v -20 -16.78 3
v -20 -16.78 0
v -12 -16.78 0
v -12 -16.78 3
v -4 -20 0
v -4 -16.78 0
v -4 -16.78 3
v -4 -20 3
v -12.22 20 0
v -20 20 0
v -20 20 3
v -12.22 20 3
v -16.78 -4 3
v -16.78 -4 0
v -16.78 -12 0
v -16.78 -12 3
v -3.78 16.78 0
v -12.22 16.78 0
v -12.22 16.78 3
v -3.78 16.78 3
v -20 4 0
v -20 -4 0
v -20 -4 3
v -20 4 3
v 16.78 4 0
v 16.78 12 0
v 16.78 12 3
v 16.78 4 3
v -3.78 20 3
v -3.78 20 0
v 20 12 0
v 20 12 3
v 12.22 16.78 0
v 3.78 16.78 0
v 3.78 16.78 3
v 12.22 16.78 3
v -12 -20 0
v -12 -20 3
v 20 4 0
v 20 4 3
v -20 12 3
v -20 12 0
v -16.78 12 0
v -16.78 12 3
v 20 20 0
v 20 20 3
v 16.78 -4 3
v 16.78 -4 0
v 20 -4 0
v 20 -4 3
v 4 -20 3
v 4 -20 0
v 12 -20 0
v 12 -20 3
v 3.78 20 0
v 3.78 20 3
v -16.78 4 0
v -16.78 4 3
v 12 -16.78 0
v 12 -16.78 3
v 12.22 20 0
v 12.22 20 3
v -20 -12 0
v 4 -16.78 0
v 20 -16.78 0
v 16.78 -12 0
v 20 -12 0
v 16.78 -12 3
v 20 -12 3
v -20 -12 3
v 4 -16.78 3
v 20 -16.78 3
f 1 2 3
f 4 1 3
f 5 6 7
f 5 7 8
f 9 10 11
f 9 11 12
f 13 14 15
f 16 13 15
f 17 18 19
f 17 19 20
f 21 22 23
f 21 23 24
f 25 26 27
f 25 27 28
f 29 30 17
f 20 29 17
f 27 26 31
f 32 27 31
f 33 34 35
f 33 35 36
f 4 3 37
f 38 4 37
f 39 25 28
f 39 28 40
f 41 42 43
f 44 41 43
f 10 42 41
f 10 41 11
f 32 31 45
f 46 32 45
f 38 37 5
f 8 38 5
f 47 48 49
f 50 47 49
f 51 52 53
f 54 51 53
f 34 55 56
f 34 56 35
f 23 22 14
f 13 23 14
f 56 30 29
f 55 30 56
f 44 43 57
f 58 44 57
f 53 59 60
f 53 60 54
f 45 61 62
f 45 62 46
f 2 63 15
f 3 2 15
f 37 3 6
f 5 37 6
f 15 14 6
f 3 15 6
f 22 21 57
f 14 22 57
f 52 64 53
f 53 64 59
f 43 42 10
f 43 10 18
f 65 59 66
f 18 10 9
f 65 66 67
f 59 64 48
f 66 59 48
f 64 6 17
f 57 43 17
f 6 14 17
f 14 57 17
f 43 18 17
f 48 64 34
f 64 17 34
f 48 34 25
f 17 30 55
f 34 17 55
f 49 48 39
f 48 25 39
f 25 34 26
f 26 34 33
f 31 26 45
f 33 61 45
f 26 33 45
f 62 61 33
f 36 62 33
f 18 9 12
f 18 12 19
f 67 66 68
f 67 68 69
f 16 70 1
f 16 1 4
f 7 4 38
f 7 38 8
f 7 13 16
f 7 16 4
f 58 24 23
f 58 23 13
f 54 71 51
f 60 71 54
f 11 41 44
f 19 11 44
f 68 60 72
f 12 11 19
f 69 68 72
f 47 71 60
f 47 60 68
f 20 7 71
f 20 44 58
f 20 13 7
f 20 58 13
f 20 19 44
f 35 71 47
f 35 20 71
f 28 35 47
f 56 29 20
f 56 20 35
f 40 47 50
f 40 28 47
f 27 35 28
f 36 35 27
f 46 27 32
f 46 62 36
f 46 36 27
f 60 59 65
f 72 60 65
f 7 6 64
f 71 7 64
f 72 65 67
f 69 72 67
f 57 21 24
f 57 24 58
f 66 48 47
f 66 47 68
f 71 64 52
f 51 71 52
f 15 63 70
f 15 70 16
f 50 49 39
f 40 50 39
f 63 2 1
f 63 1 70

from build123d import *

# Parameters (mm, degrees)
F0_W     = 40
F0_H     = 40
F1_DEPTH = 3
F2_W     = 8
F2_H     = 3
F2_W_2   = 3
F2_H_2   = 8
F3_DEPTH = 3.001
F4_W     = 8.44
F4_H     = 3.22
F4_W_2   = 8
F4_H_2   = 0.22
F4_W_3   = 0.22
F4_H_3   = 8
F5_DEPTH = 3.001


with BuildPart() as f1:
    # F0 (on Top) → F1 (new body)
    with BuildSketch(Plane.XY):
        Rectangle(F0_W, F0_H)
    extrude(amount=F1_DEPTH)

    # F2 (on face) → F3 (cut, through all)
    with BuildSketch(Plane(origin=(0, 0, 0), x_dir=(1, 0, 0), z_dir=(0, 0, -1))):
        with Locations((-8, -18.5)):
            Rectangle(F2_W, F2_H)
        with Locations((8, -18.5)):
            Rectangle(F2_W, F2_H)
        with Locations((16, 18.5)):
            Rectangle(F2_W, F2_H)
        with Locations((0, 18.5)):
            Rectangle(F2_W, F2_H)
        with Locations((-18.5, -8)):
            Rectangle(F2_W_2, F2_H_2)
        with Locations((-18.5, 8)):
            Rectangle(F2_W_2, F2_H_2)
        with Locations((18.5, -8)):
            Rectangle(F2_W_2, F2_H_2)
        with Locations((18.5, 8)):
            Rectangle(F2_W_2, F2_H_2)
        with Locations((-16, 18.5)):
            Rectangle(F2_W, F2_H)
    extrude(amount=-F3_DEPTH, mode=Mode.SUBTRACT)

    # F4 (on face) → F5 (cut, through all)
    with BuildSketch(Plane(origin=(0, 0, 0), x_dir=(1, 0, 0), z_dir=(0, 0, -1))):
        with Locations((-8, -18.39)):
            Rectangle(F4_W, F4_H)
        with Locations((8, -18.39)):
            Rectangle(F4_W, F4_H)
        with Locations((-16, 16.89)):
            Rectangle(F4_W_2, F4_H_2)
        with Locations((0, 16.89)):
            Rectangle(F4_W_2, F4_H_2)
        with Locations((16, 16.89)):
            Rectangle(F4_W_2, F4_H_2)
        with Locations((-16.89, -8)):
            Rectangle(F4_W_3, F4_H_3)
        with Locations((-16.89, 8)):
            Rectangle(F4_W_3, F4_H_3)
        with Locations((16.89, -8)):
            Rectangle(F4_W_3, F4_H_3)
        with Locations((16.89, 8)):
            Rectangle(F4_W_3, F4_H_3)
    extrude(amount=-F5_DEPTH, mode=Mode.SUBTRACT)


solid = f1.part
